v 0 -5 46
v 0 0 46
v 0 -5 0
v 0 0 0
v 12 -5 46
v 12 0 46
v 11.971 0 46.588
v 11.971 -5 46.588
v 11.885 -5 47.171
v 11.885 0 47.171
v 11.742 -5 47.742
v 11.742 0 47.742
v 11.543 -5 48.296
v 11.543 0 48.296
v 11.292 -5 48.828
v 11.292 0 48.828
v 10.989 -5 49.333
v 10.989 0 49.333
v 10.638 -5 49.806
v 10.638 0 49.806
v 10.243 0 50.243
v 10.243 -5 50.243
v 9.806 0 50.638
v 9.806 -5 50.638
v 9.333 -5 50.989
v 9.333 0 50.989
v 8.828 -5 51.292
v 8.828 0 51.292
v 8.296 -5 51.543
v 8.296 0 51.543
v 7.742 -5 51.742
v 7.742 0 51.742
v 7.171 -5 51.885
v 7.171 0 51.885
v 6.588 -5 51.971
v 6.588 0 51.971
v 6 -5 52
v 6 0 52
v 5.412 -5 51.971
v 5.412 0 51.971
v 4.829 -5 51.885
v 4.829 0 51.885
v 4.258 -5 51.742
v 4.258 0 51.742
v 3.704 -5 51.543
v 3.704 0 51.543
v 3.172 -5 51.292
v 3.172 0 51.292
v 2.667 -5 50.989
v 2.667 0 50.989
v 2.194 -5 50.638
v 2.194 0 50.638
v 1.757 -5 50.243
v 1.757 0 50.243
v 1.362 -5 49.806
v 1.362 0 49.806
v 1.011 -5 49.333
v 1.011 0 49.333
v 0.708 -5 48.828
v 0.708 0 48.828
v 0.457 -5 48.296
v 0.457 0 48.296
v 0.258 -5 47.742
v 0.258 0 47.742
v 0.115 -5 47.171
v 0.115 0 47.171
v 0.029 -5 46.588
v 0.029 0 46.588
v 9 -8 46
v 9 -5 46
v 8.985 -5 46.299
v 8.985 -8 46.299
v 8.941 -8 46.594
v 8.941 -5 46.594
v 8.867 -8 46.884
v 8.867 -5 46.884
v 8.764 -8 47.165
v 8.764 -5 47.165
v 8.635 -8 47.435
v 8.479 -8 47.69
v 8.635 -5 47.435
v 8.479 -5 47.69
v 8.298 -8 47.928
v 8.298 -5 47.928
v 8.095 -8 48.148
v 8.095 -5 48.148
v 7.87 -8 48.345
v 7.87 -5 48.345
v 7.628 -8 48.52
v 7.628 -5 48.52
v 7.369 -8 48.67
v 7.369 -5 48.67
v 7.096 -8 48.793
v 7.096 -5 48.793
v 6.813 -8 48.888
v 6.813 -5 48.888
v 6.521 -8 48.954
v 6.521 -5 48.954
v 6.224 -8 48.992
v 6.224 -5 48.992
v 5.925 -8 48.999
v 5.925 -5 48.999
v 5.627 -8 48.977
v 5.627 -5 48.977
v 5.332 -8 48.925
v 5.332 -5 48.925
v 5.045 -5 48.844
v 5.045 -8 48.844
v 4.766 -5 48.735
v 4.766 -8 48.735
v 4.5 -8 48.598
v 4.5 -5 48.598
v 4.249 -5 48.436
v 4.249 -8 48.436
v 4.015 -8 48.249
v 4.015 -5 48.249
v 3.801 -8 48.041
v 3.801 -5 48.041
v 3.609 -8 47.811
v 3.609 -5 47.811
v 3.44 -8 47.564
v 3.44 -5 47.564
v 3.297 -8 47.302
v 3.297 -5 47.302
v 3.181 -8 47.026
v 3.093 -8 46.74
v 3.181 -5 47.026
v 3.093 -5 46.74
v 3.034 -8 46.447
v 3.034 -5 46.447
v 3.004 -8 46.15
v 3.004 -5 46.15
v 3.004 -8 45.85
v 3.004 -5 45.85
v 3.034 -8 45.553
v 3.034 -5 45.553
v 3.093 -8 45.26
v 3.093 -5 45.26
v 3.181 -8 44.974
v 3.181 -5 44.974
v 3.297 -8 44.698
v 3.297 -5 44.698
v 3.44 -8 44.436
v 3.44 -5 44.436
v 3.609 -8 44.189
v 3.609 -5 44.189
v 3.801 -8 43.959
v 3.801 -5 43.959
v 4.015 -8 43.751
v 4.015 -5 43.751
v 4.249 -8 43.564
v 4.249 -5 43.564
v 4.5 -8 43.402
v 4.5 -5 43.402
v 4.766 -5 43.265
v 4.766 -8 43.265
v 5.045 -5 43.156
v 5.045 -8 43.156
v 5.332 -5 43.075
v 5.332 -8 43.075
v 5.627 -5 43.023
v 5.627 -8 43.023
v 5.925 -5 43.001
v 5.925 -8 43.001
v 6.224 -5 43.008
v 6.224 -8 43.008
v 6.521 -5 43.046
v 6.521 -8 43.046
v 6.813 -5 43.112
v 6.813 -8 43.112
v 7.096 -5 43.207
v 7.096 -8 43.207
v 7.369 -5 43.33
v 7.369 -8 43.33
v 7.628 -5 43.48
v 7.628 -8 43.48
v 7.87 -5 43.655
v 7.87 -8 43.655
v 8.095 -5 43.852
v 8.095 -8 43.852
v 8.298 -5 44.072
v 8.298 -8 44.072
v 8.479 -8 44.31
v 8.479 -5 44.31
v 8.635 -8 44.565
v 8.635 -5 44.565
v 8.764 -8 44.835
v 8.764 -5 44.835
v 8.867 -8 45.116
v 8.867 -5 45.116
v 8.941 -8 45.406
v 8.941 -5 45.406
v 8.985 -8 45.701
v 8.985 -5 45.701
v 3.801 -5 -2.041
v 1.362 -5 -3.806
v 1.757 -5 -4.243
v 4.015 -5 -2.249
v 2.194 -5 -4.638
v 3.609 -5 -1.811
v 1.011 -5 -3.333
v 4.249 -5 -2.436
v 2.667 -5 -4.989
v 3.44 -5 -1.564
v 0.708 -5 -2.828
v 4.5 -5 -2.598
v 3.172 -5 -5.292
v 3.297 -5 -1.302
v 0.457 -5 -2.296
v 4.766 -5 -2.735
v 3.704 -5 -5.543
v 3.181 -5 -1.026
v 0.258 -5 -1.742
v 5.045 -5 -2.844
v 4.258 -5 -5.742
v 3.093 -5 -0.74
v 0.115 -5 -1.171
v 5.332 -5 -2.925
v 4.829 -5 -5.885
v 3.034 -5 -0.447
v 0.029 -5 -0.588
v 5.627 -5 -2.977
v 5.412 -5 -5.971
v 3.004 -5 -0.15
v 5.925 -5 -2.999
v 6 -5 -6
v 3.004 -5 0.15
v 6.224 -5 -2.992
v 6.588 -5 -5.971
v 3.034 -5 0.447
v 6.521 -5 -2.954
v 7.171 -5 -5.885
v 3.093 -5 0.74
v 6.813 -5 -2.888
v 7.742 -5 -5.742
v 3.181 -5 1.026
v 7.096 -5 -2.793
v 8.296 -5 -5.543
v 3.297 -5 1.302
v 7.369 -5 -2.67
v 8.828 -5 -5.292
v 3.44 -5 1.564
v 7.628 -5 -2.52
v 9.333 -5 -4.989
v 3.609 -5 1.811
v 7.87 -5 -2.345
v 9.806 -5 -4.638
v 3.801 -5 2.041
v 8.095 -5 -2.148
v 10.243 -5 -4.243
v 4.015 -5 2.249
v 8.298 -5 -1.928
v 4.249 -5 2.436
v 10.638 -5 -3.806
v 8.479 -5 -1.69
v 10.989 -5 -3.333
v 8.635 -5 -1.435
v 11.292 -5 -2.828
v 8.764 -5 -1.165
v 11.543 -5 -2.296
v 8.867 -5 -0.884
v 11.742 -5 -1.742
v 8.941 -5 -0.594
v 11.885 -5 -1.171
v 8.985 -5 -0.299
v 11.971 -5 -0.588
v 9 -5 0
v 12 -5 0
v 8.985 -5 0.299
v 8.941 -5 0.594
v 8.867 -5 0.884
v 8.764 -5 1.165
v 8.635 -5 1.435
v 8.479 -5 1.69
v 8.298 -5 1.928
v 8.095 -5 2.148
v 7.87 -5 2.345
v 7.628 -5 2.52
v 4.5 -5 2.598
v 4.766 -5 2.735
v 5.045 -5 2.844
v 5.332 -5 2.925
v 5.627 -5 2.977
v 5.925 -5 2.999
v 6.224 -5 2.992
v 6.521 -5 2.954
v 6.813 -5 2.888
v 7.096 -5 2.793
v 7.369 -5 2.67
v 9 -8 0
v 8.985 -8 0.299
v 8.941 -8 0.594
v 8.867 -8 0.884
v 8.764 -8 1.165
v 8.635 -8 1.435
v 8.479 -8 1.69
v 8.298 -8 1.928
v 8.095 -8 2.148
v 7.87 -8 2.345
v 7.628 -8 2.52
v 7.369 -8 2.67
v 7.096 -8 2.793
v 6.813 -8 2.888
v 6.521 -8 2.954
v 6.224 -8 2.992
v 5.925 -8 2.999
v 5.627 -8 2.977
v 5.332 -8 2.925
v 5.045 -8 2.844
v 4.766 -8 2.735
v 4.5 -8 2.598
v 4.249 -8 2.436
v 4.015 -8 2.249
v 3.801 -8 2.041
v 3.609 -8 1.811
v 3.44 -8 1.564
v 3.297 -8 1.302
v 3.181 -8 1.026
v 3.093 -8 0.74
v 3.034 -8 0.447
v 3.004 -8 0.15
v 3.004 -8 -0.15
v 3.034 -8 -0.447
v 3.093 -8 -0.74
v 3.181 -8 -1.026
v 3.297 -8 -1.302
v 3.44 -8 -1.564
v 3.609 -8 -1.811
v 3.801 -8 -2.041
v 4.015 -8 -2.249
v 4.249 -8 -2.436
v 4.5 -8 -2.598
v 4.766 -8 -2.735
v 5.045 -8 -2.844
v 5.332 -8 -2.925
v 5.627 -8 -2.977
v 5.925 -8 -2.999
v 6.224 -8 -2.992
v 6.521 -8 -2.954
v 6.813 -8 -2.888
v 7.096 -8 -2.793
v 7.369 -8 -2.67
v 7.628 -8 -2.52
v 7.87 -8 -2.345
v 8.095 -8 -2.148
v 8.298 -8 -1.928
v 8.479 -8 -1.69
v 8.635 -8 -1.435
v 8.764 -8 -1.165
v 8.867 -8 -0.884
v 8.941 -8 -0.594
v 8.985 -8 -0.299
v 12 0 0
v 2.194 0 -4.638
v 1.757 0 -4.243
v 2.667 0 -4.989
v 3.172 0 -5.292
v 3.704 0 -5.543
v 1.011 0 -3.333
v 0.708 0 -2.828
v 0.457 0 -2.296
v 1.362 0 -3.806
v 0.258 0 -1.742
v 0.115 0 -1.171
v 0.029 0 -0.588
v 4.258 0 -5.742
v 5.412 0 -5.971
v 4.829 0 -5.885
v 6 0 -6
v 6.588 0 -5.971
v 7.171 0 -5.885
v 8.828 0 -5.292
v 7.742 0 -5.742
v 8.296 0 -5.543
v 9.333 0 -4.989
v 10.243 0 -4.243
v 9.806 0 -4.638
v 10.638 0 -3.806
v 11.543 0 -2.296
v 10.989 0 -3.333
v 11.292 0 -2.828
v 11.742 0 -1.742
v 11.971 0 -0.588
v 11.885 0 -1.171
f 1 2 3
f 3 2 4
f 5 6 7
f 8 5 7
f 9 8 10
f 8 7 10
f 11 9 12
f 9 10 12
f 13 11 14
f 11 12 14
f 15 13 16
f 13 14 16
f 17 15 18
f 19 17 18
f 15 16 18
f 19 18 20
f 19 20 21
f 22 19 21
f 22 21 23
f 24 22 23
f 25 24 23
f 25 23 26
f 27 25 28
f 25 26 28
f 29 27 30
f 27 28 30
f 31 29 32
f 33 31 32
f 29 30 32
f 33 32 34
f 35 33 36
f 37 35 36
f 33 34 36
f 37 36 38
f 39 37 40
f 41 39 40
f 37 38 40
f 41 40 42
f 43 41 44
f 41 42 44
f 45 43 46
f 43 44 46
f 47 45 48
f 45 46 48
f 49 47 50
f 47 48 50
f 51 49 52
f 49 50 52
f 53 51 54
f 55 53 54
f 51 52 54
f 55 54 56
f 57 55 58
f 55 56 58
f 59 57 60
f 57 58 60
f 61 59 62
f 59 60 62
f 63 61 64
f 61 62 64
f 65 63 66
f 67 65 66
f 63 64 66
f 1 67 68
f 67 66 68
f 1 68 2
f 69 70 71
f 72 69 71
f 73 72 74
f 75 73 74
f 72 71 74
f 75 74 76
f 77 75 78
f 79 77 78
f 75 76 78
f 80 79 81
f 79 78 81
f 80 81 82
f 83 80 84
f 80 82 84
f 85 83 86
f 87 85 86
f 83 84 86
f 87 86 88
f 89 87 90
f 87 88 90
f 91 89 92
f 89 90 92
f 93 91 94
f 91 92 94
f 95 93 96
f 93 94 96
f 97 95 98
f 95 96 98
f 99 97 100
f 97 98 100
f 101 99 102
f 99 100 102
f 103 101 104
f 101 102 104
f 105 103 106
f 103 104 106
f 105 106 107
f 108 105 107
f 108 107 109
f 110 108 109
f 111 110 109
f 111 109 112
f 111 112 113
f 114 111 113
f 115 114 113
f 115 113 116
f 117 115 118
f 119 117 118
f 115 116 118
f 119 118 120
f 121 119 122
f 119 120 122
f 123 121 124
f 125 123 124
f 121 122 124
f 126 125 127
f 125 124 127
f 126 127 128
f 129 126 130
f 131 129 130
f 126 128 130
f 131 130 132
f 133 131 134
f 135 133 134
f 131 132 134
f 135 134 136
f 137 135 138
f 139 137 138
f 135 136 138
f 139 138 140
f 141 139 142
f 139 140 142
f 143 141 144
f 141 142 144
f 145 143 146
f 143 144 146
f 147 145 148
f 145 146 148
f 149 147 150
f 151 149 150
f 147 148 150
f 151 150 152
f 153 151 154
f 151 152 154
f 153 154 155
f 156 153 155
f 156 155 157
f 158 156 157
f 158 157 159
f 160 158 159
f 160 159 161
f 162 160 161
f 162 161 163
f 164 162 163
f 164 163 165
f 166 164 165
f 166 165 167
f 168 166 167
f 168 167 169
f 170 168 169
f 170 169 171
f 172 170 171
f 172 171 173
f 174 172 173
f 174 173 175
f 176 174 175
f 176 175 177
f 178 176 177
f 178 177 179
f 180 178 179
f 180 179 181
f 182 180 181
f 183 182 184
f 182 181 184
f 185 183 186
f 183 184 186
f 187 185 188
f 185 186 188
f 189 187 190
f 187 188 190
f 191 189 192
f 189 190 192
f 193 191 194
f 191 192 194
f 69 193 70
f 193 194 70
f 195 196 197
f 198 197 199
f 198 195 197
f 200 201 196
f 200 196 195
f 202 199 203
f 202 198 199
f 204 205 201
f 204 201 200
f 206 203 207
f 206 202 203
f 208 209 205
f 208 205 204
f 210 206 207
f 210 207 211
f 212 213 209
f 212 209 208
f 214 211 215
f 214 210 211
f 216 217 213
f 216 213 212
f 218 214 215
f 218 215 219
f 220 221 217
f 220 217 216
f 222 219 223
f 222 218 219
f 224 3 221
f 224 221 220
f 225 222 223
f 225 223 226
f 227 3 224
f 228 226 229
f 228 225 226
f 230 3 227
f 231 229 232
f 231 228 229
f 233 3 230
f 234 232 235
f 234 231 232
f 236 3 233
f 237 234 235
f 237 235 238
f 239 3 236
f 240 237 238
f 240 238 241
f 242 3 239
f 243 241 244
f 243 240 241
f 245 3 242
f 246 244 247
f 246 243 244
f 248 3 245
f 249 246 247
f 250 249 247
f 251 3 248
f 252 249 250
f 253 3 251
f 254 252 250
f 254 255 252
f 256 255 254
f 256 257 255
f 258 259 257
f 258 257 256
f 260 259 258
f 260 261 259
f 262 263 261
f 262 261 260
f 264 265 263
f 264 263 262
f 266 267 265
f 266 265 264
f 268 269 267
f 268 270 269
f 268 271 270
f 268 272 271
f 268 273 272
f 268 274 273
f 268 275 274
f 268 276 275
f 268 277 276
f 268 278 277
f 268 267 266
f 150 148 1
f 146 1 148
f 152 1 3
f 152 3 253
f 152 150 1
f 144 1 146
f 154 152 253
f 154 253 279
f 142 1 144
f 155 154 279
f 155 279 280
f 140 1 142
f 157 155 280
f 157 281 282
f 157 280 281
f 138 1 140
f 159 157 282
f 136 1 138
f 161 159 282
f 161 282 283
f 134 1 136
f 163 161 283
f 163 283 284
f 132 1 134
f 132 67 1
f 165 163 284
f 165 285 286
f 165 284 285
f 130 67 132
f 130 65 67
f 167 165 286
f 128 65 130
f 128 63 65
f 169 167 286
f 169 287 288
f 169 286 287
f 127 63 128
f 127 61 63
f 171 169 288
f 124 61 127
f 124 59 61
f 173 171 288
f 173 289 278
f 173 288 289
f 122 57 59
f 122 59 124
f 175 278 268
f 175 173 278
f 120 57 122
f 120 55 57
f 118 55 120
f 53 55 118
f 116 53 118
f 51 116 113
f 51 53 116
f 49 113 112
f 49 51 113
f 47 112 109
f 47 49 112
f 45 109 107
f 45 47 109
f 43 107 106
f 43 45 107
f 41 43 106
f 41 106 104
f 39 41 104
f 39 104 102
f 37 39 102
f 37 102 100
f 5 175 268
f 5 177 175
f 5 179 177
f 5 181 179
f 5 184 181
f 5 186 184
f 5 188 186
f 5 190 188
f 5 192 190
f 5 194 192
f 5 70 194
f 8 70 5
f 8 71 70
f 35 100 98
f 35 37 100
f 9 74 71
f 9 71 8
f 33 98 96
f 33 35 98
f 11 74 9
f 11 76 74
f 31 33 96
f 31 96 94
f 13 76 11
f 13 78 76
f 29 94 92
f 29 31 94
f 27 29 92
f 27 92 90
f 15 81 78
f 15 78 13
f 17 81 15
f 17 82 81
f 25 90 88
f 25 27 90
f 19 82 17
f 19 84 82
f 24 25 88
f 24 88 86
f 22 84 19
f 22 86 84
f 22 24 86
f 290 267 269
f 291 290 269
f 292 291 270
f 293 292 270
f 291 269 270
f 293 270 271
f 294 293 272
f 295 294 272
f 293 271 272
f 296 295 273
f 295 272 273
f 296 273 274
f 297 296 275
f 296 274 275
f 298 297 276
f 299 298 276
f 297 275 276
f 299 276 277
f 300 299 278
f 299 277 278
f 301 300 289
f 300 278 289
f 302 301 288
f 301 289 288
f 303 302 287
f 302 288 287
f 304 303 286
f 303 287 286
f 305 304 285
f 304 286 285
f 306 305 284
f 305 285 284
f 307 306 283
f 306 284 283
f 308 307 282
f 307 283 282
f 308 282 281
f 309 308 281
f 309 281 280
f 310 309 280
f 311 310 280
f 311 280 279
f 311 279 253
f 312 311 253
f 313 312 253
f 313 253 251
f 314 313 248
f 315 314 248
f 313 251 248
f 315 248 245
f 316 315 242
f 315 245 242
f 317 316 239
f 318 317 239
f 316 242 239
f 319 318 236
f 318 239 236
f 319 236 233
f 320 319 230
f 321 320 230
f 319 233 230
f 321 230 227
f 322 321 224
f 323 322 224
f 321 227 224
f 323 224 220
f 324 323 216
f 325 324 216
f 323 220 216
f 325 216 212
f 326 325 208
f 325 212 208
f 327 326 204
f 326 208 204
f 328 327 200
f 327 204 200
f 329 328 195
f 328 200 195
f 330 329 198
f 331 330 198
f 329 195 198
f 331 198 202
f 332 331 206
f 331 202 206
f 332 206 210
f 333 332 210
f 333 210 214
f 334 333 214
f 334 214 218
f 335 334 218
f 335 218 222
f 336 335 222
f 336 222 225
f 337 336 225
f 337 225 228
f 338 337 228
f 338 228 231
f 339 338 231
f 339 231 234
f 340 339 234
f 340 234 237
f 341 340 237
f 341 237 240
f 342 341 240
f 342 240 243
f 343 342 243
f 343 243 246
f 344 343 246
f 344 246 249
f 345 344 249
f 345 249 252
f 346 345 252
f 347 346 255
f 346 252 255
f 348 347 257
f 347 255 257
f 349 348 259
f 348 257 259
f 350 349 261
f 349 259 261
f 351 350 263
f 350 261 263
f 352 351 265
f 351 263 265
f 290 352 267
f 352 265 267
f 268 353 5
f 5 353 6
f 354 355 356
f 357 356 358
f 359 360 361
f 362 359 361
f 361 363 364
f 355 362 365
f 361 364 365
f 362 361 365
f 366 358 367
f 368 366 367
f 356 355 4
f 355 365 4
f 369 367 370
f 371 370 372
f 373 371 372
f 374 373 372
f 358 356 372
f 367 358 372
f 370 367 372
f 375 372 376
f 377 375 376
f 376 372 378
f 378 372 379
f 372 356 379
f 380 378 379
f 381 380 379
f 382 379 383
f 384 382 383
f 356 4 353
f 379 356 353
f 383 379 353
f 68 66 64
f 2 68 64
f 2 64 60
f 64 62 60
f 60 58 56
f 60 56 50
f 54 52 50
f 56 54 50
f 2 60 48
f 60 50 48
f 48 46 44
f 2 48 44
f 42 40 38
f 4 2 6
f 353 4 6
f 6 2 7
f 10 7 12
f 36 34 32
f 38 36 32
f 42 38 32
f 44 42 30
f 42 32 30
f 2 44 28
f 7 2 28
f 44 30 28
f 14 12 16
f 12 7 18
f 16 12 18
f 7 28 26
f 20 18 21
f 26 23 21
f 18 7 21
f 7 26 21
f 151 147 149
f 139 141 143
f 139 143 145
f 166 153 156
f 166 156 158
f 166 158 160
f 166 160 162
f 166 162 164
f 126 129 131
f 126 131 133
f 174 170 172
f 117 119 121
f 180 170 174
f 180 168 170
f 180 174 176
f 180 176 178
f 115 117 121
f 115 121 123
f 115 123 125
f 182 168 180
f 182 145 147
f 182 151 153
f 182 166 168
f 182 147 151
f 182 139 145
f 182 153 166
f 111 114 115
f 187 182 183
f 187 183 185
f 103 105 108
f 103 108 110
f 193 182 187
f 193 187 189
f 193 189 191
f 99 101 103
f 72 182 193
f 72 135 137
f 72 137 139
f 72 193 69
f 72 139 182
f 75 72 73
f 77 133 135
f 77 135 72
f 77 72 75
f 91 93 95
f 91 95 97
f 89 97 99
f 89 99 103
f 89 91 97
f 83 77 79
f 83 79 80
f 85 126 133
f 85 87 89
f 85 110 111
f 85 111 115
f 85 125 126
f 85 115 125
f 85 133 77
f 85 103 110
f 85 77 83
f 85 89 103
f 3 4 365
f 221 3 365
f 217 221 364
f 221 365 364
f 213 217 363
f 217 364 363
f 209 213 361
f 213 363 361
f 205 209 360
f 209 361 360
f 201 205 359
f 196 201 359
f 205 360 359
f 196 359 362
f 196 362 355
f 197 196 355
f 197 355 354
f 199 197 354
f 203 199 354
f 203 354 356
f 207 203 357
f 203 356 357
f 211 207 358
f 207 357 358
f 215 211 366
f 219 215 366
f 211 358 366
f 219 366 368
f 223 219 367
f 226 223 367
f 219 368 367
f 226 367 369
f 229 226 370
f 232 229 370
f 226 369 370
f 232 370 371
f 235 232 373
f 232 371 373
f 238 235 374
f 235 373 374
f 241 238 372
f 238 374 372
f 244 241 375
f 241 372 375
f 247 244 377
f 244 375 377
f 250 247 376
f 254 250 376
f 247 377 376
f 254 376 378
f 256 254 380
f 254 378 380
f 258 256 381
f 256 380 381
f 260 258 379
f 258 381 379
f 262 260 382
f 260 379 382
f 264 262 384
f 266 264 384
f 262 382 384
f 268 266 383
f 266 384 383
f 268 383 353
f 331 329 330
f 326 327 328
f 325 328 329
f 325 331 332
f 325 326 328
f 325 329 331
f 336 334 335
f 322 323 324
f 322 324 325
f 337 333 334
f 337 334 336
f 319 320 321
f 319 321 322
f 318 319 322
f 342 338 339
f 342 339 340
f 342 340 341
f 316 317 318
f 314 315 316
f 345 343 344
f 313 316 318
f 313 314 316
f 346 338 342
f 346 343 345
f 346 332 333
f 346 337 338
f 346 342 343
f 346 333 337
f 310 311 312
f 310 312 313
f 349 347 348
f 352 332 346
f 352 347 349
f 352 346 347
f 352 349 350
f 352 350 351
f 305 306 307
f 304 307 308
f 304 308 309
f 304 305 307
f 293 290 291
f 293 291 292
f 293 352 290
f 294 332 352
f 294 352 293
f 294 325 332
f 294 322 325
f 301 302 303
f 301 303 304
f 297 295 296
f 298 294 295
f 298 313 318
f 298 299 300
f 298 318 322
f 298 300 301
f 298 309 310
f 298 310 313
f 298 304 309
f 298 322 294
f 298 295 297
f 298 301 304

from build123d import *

# Parameters (mm, degrees)
F1_DEPTH = 5
F2_R     = 3
F3_DEPTH = 3


with BuildPart() as f1:
    # F0 (on Front) → F1 (new body)
    with BuildSketch(Plane.XZ):
        with BuildLine():
            Line((0, 46), (0, 0))
            ThreePointArc((0, 0), (6, -6), (12, 0))
            Line((12, 0), (12, 46))
            ThreePointArc((12, 46), (6, 52), (0, 46))
        make_face()
    extrude(amount=F1_DEPTH)

    # F2 (on face) → F3 (join)
    with BuildSketch(Plane.XZ.offset(5)):
        with Locations((6, 46)):
            Circle(F2_R)
        with Locations((6, 0)):
            Circle(F2_R)
    extrude(amount=F3_DEPTH)


solid = f1.part
